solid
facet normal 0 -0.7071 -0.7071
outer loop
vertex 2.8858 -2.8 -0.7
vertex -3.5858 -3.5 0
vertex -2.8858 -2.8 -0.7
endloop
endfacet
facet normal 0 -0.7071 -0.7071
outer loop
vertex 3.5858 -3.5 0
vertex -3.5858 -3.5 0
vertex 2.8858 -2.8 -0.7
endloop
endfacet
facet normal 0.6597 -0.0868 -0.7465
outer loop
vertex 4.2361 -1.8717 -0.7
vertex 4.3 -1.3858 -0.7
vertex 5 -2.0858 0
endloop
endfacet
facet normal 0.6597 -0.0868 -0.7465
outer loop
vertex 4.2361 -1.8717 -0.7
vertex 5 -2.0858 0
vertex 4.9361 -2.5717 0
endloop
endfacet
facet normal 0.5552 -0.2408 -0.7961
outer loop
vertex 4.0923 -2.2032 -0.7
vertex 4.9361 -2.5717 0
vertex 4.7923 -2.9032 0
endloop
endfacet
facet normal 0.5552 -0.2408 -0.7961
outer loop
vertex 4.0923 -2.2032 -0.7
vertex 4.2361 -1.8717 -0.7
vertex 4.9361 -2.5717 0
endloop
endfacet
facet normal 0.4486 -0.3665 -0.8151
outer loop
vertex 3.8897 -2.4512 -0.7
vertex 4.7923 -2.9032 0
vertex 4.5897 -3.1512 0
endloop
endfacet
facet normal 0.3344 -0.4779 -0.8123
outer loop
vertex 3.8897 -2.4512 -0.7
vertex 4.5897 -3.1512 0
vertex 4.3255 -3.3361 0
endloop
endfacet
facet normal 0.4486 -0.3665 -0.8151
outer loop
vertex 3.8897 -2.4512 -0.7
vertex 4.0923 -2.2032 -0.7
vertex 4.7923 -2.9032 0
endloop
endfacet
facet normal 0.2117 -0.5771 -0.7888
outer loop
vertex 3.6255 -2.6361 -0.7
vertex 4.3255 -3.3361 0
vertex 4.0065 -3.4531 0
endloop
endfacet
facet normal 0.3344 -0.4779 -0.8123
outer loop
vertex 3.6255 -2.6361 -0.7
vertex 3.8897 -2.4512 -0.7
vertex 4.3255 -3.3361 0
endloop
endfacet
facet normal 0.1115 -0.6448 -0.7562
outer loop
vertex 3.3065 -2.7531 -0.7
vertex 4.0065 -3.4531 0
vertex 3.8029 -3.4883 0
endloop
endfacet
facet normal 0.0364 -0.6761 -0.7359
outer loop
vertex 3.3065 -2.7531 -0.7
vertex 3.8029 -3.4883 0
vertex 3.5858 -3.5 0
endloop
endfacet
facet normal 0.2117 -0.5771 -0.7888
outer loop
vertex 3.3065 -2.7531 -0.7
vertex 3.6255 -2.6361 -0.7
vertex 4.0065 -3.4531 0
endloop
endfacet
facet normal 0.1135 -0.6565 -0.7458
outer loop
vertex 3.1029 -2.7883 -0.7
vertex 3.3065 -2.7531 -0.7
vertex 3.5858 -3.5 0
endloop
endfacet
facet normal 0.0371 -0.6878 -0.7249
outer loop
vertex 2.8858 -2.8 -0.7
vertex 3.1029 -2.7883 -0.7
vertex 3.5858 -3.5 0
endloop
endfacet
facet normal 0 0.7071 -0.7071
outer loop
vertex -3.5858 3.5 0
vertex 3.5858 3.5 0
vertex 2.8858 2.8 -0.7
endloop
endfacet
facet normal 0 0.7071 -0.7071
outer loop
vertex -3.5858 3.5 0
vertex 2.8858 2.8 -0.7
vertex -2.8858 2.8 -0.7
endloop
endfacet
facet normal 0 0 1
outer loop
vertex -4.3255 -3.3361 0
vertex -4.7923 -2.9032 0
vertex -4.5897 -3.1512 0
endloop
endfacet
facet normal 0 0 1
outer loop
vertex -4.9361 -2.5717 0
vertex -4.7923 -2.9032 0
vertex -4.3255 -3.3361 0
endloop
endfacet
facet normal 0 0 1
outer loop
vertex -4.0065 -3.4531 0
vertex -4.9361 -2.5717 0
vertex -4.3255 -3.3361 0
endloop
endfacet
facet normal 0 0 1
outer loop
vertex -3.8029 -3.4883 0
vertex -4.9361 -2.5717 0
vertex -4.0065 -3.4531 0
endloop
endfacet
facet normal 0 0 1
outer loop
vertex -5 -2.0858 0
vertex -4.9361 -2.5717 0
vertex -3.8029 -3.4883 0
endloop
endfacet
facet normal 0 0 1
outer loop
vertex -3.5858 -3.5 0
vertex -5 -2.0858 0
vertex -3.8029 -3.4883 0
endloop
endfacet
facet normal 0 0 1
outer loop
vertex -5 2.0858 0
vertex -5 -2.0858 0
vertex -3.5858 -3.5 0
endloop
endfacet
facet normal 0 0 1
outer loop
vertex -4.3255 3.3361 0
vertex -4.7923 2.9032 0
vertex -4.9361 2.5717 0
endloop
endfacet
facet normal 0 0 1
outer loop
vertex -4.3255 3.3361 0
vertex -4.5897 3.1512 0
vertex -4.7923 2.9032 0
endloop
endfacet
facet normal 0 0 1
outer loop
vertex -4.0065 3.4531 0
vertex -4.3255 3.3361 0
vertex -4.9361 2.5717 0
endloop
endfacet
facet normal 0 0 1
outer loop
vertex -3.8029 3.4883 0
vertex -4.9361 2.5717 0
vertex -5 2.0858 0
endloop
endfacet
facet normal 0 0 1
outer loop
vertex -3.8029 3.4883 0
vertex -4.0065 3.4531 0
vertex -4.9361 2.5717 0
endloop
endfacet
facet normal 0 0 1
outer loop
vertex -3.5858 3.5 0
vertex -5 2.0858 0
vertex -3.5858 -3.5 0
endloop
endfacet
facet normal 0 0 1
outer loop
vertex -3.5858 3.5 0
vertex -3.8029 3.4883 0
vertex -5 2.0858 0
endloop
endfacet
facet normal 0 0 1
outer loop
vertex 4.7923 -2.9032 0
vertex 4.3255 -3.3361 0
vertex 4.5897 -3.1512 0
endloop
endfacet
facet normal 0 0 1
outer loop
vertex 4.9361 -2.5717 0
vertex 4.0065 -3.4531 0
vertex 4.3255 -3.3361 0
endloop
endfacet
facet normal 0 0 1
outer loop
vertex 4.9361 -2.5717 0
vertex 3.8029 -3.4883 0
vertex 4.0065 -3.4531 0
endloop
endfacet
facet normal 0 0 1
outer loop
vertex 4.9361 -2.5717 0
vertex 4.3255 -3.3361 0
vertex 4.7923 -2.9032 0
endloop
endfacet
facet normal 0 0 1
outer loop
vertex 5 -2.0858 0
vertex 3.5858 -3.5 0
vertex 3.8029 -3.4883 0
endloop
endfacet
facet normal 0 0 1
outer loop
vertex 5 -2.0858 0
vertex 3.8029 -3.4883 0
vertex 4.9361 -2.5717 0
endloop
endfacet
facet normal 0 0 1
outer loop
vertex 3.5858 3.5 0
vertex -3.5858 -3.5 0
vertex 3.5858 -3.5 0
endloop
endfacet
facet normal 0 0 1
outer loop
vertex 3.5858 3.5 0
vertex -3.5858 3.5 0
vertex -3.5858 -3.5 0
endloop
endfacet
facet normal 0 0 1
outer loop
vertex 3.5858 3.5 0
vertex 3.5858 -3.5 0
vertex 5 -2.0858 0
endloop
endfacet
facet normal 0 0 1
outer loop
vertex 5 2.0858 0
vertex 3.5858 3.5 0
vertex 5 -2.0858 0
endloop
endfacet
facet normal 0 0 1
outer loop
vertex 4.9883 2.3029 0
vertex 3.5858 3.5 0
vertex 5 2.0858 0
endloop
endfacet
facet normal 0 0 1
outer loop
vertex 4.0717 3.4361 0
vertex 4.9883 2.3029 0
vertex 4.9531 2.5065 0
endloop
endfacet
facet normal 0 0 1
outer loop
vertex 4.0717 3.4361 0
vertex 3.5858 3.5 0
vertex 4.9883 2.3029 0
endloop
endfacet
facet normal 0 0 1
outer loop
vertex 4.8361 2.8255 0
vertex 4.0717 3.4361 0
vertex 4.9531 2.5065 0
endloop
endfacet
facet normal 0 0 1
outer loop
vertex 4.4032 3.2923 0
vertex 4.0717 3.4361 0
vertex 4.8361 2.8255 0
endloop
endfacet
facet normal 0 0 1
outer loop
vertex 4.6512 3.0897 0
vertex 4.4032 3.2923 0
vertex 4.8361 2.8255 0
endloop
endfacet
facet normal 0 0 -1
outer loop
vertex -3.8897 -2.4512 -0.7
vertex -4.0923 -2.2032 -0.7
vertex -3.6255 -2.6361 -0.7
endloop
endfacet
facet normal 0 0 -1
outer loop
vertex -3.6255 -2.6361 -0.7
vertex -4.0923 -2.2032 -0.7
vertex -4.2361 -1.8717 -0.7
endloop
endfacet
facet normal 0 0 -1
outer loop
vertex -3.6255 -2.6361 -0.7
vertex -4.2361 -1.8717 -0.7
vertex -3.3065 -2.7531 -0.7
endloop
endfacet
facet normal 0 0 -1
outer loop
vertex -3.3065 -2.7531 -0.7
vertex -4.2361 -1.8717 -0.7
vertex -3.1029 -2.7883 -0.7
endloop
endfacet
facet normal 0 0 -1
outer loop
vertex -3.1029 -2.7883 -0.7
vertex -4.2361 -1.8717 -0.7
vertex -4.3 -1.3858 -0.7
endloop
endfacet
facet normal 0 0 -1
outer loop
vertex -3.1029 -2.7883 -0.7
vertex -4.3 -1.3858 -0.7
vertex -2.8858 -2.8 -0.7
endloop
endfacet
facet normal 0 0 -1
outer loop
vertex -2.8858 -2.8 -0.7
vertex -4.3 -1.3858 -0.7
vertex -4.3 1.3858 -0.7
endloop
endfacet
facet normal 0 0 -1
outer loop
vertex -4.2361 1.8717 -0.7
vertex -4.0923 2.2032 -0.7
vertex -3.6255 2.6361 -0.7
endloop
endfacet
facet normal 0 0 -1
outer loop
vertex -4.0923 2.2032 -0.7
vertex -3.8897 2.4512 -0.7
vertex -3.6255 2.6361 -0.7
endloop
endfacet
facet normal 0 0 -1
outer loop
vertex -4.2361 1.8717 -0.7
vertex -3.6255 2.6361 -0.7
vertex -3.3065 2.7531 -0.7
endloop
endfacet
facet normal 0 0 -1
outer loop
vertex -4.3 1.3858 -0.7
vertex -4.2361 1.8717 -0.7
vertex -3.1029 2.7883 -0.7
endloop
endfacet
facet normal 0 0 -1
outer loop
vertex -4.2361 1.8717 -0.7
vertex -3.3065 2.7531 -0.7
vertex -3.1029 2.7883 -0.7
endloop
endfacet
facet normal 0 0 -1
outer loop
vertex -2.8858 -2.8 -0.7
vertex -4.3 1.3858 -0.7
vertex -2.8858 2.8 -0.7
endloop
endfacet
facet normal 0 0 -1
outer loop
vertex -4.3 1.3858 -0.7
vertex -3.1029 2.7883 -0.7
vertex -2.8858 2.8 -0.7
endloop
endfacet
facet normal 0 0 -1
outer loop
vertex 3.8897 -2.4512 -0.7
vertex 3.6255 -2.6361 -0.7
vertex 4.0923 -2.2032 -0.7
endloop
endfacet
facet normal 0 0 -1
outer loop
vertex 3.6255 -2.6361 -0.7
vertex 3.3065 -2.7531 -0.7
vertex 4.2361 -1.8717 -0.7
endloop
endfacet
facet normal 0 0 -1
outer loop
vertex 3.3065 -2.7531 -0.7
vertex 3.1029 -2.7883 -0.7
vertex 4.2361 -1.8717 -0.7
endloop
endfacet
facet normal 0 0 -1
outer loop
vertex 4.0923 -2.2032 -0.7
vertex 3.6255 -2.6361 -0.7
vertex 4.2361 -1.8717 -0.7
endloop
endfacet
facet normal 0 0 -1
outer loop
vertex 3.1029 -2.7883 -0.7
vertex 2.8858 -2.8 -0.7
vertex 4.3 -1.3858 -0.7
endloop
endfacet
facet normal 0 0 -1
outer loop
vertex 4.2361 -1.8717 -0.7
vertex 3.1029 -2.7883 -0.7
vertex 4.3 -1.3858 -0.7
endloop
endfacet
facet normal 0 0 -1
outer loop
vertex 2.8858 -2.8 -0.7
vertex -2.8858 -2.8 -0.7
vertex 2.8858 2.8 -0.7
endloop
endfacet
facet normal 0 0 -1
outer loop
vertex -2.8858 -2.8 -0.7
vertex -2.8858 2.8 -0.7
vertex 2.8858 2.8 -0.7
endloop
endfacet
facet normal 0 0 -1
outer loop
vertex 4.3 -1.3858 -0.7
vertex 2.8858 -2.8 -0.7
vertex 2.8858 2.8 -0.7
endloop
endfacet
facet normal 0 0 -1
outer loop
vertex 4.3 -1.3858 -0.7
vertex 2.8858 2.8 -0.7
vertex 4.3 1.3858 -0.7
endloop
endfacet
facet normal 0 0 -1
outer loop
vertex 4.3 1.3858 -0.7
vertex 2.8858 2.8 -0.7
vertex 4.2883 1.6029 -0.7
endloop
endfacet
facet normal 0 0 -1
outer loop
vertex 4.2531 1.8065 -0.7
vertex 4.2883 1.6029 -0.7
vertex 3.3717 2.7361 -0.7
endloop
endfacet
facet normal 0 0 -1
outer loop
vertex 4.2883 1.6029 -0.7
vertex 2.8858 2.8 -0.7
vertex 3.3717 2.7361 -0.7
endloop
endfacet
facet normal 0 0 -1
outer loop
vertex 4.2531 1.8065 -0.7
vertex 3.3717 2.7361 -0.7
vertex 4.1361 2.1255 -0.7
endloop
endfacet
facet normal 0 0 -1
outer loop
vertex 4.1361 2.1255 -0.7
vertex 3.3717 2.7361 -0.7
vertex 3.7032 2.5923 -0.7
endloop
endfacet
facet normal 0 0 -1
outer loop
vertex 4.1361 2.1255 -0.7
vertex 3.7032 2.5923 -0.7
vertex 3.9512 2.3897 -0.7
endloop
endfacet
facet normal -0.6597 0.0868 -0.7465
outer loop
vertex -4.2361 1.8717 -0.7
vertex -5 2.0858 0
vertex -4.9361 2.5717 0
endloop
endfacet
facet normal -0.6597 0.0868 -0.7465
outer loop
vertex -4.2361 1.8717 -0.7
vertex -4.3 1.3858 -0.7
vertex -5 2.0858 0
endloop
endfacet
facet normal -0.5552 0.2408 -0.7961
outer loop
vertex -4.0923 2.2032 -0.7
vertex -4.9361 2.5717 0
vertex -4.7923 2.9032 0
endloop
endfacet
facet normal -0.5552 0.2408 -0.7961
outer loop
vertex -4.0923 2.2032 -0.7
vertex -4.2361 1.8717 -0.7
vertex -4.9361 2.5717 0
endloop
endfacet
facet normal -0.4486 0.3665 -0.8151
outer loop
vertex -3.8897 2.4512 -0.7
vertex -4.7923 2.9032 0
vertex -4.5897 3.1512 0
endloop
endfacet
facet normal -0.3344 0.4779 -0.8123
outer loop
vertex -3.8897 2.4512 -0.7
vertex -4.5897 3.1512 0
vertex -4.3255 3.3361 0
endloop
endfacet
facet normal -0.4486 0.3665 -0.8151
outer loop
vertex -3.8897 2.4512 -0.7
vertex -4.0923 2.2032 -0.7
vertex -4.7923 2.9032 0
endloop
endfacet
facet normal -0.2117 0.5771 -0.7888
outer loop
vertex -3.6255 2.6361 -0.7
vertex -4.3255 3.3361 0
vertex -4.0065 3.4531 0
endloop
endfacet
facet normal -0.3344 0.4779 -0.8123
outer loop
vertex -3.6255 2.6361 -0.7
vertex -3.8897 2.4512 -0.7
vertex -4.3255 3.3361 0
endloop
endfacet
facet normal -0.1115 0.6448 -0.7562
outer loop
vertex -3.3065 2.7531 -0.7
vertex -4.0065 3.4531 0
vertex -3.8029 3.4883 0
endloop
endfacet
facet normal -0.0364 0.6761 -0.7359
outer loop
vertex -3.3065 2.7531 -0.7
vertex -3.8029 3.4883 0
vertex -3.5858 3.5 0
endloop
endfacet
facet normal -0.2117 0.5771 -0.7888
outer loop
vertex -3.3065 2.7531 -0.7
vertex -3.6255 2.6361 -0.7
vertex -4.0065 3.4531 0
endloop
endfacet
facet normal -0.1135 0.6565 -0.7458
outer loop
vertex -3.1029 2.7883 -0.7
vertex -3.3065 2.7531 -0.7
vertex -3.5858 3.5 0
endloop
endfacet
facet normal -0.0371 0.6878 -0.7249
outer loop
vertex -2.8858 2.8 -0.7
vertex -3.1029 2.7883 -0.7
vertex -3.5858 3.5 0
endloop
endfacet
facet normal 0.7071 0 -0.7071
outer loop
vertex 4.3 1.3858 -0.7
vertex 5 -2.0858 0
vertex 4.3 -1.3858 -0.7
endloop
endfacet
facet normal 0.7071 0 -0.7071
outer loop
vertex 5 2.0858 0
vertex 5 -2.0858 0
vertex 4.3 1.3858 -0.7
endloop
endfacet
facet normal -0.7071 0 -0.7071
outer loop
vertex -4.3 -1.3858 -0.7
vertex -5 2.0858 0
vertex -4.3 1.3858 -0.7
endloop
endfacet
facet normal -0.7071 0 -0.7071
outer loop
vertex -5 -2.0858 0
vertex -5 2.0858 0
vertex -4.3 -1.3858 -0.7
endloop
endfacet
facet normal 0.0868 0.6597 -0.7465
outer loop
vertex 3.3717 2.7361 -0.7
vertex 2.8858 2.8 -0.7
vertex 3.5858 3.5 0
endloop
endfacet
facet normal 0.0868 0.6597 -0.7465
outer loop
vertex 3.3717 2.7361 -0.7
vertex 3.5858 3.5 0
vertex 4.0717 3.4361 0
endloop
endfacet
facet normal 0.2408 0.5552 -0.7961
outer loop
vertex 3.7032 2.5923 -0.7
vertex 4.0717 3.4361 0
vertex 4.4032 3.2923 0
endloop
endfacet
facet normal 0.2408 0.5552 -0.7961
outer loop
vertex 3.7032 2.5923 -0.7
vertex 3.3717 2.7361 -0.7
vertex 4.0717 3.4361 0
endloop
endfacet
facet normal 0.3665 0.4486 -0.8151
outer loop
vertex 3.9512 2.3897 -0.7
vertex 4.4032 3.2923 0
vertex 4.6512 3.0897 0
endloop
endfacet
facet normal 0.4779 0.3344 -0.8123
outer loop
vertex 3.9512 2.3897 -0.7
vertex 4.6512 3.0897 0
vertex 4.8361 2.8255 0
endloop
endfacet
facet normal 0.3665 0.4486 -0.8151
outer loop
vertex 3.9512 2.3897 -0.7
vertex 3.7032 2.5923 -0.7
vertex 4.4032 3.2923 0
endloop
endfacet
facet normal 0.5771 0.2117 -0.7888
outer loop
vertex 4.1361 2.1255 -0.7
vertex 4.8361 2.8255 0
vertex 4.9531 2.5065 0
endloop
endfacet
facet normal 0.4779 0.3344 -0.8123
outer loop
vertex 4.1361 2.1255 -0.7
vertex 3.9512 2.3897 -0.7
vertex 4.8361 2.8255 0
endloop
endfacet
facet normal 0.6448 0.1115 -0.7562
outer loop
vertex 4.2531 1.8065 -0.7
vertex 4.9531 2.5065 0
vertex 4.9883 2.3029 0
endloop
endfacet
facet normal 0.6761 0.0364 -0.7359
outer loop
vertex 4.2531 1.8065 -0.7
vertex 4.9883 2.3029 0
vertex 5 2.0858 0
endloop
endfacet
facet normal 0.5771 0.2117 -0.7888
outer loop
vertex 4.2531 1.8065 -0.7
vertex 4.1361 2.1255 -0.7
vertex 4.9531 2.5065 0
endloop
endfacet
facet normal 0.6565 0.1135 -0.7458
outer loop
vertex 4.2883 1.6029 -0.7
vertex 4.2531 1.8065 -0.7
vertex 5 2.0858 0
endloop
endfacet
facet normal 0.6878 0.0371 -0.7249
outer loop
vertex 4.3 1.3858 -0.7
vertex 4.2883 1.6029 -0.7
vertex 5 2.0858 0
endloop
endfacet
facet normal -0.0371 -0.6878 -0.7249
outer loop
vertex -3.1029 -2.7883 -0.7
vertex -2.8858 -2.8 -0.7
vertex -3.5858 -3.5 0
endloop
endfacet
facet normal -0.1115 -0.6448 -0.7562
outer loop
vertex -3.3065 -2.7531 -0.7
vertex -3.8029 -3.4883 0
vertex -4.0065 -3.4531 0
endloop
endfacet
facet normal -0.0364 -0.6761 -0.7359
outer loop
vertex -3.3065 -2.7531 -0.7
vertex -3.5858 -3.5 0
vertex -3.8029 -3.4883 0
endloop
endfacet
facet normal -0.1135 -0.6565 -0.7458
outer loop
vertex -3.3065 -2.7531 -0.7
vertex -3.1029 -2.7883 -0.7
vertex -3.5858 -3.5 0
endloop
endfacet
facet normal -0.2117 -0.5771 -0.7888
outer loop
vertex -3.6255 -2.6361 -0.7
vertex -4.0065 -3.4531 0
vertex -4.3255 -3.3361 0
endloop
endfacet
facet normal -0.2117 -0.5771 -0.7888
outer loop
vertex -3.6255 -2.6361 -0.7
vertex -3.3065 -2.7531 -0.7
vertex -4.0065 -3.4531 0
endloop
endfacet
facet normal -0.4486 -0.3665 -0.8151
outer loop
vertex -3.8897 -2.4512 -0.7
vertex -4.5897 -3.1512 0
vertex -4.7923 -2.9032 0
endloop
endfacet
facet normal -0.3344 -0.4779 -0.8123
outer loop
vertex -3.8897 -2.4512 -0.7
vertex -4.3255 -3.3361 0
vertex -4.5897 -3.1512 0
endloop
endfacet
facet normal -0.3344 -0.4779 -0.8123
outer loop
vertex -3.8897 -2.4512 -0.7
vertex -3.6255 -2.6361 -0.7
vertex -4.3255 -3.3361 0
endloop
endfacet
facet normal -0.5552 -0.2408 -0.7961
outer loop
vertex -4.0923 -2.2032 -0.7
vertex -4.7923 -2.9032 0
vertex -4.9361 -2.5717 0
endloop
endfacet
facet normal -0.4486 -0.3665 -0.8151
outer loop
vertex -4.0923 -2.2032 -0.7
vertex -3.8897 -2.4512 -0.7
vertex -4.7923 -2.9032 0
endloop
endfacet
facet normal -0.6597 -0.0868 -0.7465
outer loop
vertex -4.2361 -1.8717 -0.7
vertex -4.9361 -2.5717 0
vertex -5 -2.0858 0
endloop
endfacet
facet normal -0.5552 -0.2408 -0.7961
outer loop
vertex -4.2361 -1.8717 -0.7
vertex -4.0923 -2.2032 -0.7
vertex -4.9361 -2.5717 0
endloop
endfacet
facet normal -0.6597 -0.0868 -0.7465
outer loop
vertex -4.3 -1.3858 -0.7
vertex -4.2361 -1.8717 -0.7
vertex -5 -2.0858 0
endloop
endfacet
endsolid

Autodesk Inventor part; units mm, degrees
ref_plane "YZ Plane" through (0, 0, 0) normal (1, 0, 0) x (0, 1, 0)
ref_plane "XZ Plane" through (0, 0, 0) normal (0, 1, 0) x (-1, 0, 0)
ref_plane "XY Plane" through (0, 0, 0) normal (0, 0, 1) x (1, 0, 0)
sketch "Sketch1" plane through (0, 0, 0) normal (0, 0, 1) x (1, 0, 0)
  line L0 (-5, -3.5) -> (5, -3.5)
  line L1 (5, -3.5) -> (5, 3.5)
  line L2 (5, 3.5) -> (-5, 3.5)
  line L3 (-5, 3.5) -> (-5, -3.5)
  line L4 (-5, -3.5) -> (5, 3.5) construction
  line L5 (5, -3.5) -> (-5, 3.5) construction
  point P0 (0, 0)
  dimension "d0" = 10
  dimension "d1" = 7
extrude "Extrusion1" add sketch "Sketch1" against normal blind 0.7 draft -45
fillet "Fillet1" radius 2 4 edges at (-4.65, -3.15, -0.35) (-4.65, 3.15, -0.35) (4.65, -3.15, -0.35) (4.65, 3.15, -0.35)
properties part number "Base"
